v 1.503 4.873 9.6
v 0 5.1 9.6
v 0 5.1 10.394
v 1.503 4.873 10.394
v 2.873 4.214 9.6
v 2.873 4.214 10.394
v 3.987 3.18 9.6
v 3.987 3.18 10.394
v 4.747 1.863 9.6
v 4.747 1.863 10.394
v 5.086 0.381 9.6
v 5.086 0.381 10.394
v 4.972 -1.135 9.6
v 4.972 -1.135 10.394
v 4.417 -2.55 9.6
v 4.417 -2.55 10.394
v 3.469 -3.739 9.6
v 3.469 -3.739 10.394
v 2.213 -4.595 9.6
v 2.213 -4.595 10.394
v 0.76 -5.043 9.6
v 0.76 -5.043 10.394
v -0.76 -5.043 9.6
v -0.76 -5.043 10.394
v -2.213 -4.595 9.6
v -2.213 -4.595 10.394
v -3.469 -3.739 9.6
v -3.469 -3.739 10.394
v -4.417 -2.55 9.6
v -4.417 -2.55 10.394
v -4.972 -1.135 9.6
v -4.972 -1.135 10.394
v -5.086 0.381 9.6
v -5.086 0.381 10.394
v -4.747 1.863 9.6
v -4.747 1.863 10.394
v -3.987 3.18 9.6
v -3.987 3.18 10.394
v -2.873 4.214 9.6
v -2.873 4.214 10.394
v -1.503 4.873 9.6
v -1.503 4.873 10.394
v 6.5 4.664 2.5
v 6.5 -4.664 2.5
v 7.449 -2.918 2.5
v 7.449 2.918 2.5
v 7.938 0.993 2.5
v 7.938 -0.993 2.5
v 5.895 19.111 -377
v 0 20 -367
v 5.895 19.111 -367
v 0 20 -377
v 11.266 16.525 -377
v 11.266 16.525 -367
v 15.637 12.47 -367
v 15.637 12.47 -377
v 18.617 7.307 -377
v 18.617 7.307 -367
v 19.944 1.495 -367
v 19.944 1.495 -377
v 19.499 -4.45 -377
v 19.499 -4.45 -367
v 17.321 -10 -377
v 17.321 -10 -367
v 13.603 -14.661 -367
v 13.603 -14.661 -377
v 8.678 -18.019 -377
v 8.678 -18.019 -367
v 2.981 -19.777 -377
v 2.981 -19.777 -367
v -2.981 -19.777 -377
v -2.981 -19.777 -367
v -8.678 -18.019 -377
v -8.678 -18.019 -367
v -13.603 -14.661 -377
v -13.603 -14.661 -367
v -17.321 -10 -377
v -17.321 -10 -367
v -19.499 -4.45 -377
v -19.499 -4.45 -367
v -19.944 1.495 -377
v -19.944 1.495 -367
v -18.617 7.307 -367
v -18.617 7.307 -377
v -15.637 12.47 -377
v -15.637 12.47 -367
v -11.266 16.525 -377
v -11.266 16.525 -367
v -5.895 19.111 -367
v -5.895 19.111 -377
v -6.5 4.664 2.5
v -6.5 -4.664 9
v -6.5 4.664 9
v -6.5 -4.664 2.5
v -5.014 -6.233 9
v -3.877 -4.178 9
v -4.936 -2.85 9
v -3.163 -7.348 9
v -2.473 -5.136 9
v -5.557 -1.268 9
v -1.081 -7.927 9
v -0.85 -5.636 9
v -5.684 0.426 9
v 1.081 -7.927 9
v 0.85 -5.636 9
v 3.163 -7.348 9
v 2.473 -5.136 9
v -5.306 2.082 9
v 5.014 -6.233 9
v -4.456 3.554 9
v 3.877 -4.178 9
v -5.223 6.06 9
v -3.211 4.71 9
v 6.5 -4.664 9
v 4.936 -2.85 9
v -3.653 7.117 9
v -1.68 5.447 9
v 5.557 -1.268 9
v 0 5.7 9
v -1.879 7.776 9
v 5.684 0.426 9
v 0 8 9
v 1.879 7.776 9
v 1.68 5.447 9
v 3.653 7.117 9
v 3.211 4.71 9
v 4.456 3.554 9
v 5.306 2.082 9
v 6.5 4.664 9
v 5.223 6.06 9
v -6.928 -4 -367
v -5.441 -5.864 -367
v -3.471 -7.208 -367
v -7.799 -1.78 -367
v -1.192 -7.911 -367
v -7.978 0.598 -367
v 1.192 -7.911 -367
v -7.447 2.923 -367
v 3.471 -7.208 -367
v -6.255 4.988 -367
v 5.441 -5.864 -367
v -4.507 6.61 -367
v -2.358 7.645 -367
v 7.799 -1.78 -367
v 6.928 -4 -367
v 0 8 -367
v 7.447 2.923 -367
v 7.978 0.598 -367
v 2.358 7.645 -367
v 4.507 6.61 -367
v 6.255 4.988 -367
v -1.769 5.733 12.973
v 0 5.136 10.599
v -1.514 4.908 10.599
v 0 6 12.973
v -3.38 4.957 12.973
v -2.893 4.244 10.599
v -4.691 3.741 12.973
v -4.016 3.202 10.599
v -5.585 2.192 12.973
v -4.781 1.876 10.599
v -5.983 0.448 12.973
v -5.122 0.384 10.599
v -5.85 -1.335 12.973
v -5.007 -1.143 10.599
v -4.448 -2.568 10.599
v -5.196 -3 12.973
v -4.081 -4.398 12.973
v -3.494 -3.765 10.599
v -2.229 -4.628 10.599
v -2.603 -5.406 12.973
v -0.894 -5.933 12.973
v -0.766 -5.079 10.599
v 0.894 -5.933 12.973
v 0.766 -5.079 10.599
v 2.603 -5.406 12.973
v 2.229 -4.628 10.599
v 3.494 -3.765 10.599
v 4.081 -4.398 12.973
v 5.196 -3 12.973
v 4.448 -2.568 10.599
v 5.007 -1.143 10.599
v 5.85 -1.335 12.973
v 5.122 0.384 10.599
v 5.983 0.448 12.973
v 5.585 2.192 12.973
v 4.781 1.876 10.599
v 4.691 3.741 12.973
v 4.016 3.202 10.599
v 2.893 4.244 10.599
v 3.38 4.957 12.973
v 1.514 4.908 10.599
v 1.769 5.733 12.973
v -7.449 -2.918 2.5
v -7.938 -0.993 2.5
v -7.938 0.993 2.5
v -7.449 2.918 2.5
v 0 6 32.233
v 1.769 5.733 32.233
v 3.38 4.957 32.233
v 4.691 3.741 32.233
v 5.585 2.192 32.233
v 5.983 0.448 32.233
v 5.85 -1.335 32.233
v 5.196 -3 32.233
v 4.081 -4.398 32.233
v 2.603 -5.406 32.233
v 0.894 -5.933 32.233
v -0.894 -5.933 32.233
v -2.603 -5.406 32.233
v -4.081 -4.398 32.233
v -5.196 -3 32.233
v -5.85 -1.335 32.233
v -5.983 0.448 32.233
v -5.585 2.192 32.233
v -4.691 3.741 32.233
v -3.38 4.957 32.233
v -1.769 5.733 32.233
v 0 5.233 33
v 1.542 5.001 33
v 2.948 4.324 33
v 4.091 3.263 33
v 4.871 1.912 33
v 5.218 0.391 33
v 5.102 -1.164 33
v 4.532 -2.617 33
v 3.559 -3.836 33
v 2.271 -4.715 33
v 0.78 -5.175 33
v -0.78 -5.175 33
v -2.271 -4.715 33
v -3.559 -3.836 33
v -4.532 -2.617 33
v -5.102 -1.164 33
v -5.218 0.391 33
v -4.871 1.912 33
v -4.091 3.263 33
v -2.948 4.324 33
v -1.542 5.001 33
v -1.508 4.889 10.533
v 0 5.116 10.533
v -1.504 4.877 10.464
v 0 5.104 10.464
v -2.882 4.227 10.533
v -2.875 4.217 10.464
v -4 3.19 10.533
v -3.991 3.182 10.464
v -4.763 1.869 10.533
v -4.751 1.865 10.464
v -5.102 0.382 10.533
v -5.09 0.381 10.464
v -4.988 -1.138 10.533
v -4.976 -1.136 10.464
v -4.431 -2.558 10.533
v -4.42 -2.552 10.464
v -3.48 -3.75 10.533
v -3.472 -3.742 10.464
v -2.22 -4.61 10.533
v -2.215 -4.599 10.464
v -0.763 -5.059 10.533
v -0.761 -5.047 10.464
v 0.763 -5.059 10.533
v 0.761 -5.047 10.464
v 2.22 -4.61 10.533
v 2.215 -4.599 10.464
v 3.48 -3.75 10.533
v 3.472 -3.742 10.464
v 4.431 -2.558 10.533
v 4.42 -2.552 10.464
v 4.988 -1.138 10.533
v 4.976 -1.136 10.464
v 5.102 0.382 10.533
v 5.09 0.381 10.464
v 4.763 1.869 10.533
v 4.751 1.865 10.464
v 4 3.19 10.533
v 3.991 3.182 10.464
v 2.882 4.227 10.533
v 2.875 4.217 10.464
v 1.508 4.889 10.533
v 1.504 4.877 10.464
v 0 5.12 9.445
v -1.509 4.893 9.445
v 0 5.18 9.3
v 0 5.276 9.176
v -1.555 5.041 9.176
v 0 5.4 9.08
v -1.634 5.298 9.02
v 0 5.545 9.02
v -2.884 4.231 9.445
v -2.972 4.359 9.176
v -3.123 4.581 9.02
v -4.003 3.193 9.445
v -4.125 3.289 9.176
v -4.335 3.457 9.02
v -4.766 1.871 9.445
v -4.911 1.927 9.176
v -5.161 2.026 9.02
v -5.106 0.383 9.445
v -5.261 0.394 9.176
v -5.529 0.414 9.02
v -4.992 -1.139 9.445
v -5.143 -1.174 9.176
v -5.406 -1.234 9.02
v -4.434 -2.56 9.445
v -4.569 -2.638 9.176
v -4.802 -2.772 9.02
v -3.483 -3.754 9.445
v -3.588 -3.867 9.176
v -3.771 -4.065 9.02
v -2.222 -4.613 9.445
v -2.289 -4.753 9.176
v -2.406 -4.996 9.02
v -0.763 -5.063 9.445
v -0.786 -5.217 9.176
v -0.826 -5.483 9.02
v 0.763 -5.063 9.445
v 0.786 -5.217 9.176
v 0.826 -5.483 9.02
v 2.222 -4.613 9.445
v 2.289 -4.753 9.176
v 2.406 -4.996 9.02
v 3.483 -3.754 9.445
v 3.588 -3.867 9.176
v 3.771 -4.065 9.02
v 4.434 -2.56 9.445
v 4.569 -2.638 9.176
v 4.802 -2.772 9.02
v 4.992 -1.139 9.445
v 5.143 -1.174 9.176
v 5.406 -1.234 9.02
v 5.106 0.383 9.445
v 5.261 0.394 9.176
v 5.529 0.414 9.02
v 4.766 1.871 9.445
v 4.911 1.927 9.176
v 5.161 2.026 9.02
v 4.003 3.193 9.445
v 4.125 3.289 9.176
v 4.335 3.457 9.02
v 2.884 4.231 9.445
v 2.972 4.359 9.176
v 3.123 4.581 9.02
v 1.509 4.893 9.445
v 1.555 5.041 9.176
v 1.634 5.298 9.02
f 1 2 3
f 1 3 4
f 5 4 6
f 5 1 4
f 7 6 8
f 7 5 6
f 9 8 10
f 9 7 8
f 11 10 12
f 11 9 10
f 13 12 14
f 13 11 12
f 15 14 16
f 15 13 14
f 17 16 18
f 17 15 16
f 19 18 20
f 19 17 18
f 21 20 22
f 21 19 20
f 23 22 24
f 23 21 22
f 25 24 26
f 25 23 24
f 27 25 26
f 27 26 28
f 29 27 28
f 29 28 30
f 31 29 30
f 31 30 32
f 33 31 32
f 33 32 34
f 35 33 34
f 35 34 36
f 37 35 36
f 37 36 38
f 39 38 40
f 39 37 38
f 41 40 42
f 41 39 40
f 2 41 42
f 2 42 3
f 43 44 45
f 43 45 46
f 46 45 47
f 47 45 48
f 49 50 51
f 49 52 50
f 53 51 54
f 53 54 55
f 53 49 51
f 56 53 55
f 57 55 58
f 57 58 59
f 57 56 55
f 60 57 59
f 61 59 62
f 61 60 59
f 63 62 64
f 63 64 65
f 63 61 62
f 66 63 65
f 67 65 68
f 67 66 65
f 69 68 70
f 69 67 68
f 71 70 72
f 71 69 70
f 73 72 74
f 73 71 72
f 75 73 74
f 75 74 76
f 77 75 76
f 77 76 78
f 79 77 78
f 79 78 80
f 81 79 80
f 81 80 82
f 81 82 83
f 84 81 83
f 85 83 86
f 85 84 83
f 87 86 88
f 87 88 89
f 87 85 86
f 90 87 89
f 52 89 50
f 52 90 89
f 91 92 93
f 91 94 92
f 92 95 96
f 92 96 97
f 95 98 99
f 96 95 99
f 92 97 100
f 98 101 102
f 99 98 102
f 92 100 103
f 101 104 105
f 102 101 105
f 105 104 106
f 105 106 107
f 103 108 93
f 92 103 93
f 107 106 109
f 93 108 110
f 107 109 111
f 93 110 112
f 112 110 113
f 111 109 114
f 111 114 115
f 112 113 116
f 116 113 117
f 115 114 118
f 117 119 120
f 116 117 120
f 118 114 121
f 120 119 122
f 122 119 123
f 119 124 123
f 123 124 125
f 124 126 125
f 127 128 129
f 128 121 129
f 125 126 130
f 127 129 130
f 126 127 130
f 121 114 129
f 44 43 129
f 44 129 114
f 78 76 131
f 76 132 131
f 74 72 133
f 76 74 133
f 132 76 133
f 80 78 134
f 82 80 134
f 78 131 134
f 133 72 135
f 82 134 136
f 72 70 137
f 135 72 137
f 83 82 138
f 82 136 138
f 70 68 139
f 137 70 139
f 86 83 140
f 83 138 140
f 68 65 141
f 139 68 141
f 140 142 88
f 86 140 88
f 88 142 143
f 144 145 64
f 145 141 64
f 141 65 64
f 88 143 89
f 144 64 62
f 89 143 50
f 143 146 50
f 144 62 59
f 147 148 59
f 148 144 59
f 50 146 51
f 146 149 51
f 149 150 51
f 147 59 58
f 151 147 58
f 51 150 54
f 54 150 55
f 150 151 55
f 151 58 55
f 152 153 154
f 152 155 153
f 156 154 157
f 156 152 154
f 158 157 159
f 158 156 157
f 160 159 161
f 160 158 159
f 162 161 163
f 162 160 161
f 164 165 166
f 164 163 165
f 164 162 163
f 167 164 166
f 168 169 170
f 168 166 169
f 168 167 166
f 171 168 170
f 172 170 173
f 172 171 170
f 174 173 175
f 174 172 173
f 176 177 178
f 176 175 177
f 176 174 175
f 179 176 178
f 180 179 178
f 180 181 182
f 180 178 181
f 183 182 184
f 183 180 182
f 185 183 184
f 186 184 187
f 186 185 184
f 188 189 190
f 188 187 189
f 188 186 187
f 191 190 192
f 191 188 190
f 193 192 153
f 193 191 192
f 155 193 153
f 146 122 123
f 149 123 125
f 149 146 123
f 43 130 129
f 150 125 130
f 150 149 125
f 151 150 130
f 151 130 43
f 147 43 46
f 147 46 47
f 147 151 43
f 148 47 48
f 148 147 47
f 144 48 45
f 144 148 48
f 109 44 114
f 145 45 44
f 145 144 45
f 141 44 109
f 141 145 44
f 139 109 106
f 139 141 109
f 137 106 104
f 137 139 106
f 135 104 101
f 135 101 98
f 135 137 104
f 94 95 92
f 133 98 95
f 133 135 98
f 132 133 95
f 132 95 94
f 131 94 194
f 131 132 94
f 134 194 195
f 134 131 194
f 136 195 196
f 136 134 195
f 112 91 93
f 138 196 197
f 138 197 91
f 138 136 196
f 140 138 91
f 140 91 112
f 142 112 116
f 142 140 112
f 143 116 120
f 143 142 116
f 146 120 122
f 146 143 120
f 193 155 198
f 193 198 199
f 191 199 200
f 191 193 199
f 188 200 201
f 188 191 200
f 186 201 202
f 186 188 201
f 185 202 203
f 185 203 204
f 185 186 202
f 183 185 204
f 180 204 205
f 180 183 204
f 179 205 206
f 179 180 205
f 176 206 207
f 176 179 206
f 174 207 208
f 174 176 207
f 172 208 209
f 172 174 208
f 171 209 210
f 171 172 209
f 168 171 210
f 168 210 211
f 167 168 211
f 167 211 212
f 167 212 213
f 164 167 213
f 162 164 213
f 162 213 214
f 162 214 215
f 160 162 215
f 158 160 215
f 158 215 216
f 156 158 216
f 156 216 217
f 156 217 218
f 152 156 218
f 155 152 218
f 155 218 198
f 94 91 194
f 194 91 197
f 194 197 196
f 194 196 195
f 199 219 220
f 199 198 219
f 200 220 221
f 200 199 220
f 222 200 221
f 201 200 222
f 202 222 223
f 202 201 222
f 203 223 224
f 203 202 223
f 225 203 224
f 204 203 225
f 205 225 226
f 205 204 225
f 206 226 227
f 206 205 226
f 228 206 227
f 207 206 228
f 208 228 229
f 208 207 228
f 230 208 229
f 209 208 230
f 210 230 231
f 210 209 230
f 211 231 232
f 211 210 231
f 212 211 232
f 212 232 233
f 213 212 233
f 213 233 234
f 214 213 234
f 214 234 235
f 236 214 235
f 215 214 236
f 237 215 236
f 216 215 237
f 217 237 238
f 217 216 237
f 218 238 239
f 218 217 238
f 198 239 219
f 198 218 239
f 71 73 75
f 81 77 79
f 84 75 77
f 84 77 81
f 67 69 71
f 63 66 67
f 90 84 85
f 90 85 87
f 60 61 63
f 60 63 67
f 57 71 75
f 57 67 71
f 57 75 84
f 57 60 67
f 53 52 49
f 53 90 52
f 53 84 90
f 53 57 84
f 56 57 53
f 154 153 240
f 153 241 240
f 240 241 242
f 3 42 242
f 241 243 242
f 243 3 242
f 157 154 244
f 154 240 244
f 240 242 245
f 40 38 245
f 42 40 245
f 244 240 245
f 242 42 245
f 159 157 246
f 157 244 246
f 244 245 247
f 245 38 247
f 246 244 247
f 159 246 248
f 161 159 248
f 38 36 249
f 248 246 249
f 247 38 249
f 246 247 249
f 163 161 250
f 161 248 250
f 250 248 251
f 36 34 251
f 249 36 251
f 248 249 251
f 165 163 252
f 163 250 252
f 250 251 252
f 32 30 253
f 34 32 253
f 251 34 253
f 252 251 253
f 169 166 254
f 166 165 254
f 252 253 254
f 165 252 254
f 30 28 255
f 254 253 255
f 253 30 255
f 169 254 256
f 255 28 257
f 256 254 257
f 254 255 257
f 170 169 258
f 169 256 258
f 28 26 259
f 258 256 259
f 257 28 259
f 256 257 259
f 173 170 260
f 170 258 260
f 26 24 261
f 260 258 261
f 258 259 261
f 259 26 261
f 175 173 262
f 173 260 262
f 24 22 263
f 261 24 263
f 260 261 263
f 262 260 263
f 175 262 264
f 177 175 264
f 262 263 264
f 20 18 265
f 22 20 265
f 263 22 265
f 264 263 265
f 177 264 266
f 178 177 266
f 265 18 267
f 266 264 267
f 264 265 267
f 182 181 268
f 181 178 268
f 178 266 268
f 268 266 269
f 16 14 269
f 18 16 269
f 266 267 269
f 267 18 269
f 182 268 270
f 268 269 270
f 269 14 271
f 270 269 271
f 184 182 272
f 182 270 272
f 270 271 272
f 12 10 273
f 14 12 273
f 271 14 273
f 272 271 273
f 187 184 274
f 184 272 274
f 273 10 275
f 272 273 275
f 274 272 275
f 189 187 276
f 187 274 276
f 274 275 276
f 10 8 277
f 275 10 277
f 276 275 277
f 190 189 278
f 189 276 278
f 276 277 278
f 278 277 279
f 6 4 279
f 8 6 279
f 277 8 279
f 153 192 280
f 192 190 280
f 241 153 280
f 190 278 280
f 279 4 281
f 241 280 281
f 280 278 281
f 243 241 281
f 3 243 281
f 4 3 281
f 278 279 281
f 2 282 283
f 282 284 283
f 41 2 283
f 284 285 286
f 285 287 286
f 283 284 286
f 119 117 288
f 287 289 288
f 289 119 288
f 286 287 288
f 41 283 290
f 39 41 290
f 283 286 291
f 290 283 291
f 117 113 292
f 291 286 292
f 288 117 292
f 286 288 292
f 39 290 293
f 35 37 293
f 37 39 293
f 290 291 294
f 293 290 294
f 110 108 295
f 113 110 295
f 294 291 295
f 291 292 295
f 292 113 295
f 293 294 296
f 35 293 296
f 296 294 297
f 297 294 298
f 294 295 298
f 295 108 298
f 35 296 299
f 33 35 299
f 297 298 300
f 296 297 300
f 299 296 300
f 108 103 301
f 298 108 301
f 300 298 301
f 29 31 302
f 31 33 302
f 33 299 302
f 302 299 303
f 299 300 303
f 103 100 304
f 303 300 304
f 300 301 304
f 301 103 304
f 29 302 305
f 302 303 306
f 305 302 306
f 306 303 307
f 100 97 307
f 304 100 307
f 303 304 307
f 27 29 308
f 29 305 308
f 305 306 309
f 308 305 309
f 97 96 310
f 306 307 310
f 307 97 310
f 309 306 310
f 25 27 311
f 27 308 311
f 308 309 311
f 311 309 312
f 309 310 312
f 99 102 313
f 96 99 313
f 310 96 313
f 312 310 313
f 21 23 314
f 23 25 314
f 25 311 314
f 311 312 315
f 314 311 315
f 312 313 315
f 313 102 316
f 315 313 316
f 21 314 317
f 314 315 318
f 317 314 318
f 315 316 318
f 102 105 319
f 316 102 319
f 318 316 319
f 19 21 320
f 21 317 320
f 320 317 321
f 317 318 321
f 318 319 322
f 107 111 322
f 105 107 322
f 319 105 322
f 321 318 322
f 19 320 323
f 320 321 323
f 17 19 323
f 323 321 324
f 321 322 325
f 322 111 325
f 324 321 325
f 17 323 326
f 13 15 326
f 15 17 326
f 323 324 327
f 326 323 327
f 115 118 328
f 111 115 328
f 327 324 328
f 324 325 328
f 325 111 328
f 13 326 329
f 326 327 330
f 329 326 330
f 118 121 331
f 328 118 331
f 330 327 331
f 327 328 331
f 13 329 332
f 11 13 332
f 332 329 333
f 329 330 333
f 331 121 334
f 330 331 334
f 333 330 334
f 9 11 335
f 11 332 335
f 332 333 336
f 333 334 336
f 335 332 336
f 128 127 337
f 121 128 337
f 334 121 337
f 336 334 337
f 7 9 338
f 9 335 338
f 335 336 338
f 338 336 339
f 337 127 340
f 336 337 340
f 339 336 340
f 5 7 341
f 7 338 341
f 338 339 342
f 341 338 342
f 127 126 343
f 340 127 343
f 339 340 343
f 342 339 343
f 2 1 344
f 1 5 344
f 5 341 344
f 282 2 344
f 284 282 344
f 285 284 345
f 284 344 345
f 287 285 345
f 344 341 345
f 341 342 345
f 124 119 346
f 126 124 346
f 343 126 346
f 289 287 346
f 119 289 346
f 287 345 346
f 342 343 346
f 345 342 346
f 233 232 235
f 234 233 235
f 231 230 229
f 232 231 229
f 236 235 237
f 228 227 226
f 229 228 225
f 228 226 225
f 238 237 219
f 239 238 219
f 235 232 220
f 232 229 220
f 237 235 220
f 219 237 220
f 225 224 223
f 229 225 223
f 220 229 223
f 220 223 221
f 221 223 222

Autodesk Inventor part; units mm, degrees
sketch "Sketch_2" plane through (0, 0, 0) normal (1, 0, 0) x (0, 1, 0)
  line L0 (0, -377) -> (0, 9)
  line L1 (0, 9) -> (8, 9)
  line L2 (8, 9) -> (8, -367)
  line L3 (8, -367) -> (20, -367)
  line L4 (20, -367) -> (20, -377)
  line L5 (20, -377) -> (0, -377)
  line L6 (0, -377) -> (0, 9)
revolve "Revolution1" add sketch "Sketch_2" angle 360 about axis through (0, 0, -377) along (0, 0, -1)
sketch "Sketch_6" plane through (0, 0, 0) normal (1, 0, 0) x (0, 1, 0)
  line L0 (0, 8) -> (0, 33)
  line L1 (0, 33) -> (5.233, 33)
  line L2 (5.233, 33) -> (6, 32.233)
  line L3 (6, 32.233) -> (6, 12.9727)
  line L4 (6, 12.9727) -> (5.1362, 10.5994)
  arc A0 (5.1362, 10.5994) -> (5.1, 10.3942) centre (5.7, 10.3942) ccw
  line L5 (5.1, 10.3942) -> (5.1, 9.6)
  arc A1 (5.1, 9.6) -> (5.7, 9) centre (5.7, 9.6) ccw
  line L6 (5.7, 9) -> (6, 9)
  line L7 (6, 9) -> (6, 8)
  line L8 (6, 8) -> (0, 8)
  line L9 (0, 8) -> (0, 33)
revolve "Revolution2" add sketch "Sketch_6" angle 360 about axis through (0, 0, 8) along (0, 0, -1)
thread "Thread1" size "M12x1.25" class "6g" standard "ISO Metric profile" full length
sketch "Sketch_7" plane through (0, 0, 2.5) normal (0, 0, 1) x (1, 0, 0)
  line L0 (-13, 26) -> (-13, -13)
  line L1 (-13, -13) -> (-6.5, -13)
  line L2 (-6.5, -13) -> (-6.5, 13)
  line L3 (-6.5, 13) -> (6.5, 13)
  line L4 (6.5, 13) -> (6.5, -13)
  line L5 (6.5, -13) -> (13, -13)
  line L6 (13, -13) -> (13, 26)
  line L7 (13, 26) -> (-13, 26)
extrude "Extrusion1" cut sketch "Sketch_7" along normal blind 7.5
ref_plane "FDT_KSAUFSATZ_XY" through (0, 0, 20) normal (0, 0, 1) x (-1, 0, 0)
ref_plane "FDT_KSAUFSATZ_YZ" through (0, 0, 20) normal (-1, 0, 0) x (0, -1, 0)
ref_plane "FDT_KSAUFSATZ_ZX" through (0, 0, 20) normal (0, -1, 0) x (0, 0, 1)
ref_plane "FDT_NUT_XY" through (0, 0, 20) normal (0, 0, 1) x (-1, 0, 0)
ref_plane "FDT_NUT_YZ" through (0, 0, 20) normal (-1, 0, 0) x (0, -1, 0)
ref_plane "FDT_NUT_ZX" through (0, 0, 20) normal (0, -1, 0) x (0, 0, 1)
ref_plane "KS_XY" through (0, 0, 0) normal (0, 0, -1) x (1, 0, 0)
ref_plane "KS_YZ" through (0, 0, 0) normal (1, 0, 0) x (0, -1, 0)
ref_plane "KS_ZX" through (0, 0, 0) normal (0, -1, 0) x (0, 0, -1)
ref_plane "NUT1_XY" through (0, 0, 24) normal (0, 0, 1) x (1, 0, 0)
ref_plane "NUT1_YZ" through (0, 0, 24) normal (1, 0, 0) x (0, 1, 0)
ref_plane "NUT1_ZX" through (0, 0, 24) normal (0, 1, 0) x (0, 0, 1)
properties part number "193993 DSNU-40-300-P---(A---00--0-KS)"
